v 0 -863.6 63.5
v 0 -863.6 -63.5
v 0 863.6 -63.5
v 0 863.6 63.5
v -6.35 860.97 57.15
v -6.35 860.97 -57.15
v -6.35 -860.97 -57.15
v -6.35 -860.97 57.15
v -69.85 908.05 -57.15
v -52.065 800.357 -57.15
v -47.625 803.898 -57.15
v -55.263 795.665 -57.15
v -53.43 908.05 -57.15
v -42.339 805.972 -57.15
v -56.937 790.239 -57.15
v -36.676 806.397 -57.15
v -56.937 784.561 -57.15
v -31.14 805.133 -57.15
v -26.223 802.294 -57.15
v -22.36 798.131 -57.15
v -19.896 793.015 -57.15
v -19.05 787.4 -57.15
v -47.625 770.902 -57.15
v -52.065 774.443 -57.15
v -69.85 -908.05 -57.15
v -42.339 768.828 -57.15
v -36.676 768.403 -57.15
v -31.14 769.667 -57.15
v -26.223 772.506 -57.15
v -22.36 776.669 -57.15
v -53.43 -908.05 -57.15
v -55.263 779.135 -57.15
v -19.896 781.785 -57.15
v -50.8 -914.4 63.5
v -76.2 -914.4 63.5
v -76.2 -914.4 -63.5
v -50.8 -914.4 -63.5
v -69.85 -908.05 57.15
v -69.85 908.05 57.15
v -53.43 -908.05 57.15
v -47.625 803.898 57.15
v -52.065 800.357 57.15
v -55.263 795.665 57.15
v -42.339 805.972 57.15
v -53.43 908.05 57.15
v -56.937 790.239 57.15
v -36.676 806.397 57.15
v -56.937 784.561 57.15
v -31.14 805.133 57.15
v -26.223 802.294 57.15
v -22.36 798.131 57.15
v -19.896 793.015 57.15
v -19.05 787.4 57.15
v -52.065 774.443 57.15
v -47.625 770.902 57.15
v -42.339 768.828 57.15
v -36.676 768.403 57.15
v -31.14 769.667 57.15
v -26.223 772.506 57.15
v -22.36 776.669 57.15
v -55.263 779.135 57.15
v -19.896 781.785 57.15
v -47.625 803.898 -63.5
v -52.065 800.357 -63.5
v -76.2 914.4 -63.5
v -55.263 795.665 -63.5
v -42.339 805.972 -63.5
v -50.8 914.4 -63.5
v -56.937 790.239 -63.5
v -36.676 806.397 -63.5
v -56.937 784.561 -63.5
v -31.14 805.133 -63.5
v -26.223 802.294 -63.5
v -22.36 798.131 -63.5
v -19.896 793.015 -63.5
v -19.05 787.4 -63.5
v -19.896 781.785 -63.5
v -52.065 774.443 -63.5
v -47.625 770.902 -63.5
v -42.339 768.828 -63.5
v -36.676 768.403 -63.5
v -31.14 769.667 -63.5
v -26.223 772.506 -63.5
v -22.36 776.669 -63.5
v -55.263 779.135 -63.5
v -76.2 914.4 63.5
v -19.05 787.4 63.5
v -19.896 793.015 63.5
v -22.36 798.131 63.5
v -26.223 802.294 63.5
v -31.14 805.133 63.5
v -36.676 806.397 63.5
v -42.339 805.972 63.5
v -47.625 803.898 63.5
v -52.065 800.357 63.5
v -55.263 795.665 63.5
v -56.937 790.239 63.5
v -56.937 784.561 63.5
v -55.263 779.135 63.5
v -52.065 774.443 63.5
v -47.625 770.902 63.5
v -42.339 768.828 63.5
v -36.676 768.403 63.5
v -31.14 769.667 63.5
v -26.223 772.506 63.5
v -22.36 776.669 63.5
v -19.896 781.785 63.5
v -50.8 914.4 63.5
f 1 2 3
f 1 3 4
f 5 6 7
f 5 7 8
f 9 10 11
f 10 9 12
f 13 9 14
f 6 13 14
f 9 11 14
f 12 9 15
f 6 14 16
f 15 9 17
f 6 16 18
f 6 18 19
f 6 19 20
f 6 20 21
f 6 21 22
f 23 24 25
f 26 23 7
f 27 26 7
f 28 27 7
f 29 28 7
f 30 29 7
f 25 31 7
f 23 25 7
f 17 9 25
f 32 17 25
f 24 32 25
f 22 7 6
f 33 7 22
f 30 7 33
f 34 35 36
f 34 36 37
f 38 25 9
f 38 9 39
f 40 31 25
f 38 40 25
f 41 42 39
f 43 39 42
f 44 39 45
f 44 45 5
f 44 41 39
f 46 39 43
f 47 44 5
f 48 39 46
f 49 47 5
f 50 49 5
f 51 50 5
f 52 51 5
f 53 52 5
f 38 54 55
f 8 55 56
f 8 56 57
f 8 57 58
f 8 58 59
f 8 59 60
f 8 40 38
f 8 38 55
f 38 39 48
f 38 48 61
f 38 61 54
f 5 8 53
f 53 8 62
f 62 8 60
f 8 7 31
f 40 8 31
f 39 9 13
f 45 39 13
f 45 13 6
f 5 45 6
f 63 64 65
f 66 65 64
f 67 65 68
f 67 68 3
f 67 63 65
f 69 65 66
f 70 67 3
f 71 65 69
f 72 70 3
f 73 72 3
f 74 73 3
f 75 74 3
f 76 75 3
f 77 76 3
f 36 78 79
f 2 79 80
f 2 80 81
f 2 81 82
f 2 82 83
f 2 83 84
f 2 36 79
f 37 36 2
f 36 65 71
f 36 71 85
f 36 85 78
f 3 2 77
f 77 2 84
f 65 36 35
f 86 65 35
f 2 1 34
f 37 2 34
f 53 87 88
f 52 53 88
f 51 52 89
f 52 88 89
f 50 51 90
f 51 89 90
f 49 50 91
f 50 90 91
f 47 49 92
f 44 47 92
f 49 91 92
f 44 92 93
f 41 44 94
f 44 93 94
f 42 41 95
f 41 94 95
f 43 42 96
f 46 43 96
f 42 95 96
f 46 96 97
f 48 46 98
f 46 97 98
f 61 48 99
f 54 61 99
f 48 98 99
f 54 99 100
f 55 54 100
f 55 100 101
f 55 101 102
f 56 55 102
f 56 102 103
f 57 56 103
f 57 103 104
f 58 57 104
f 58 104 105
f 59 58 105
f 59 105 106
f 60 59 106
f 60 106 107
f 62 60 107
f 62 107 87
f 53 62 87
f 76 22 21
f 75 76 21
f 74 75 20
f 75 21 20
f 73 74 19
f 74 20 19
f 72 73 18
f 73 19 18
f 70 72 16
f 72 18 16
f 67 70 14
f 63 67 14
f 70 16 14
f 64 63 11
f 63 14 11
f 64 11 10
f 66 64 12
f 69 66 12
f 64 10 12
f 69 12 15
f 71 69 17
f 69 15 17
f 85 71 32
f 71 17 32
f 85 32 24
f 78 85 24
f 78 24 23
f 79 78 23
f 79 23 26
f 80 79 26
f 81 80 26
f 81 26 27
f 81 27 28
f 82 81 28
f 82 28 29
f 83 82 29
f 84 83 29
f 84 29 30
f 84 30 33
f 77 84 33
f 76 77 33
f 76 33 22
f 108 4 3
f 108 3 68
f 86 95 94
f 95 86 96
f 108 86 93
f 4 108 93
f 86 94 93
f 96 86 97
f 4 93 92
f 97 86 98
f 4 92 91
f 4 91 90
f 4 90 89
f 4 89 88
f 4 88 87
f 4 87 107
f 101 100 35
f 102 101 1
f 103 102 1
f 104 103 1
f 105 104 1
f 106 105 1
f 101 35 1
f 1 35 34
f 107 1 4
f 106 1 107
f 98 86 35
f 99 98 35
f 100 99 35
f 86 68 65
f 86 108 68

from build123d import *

# Parameters (mm, degrees)
F0_W          = 76.2
F0_H          = 127
F0_W_2        = 63.5
F0_H_2        = 114.3
F1_DEPTH      = 914.4
F2_R          = 19.05
F3_DEPTH      = 127.001
F5_DEPTH      = 63.5
F5_DEPTH_BACK = 63.5
F7_DEPTH      = 63.5
F7_DEPTH_BACK = 63.5
F9_DEPTH      = 63.5
F9_DEPTH_BACK = 63.5


with BuildPart() as f1:
    # F0 (on Front) → F1 (new body, symmetric)
    with BuildSketch(Plane.XZ):
        with Locations((-38.1, 0)):
            Rectangle(F0_W, F0_H)
        with Locations((-38.1, 0)):
            Rectangle(F0_W_2, F0_H_2, mode=Mode.SUBTRACT)
    extrude(amount=F1_DEPTH, both=True)

    # F2 (on face) → F3 (cut, through all)
    with BuildSketch(Plane.XY.offset(63.5)):
        with Locations((-38.1, 787.4)):
            Circle(F2_R)
    extrude(amount=-F3_DEPTH, mode=Mode.SUBTRACT)

    # F4 (on Top) → F5 (cut, two sides)
    with BuildSketch(Plane.XY) as f5_sk:
        Polygon((0, -863.6), (-50.8, -914.4), (0, -914.4), align=None)
        Polygon((0, 863.6), (0, 914.4), (-50.8, 914.4), align=None)
    extrude(amount=F5_DEPTH, mode=Mode.SUBTRACT)
    extrude(f5_sk.sketch, amount=-F5_DEPTH_BACK, mode=Mode.SUBTRACT)

    # F6 (on Top) → F7 (join, two sides)
    with BuildSketch(Plane.XY) as f7_sk:
        Polygon((-76.2, -908.05), (-76.2, -914.4), (-50.8, -914.4), (0, -863.6), (0, -854.619744), (-53.430256, -908.05), align=None)
    extrude(amount=F7_DEPTH)
    extrude(f7_sk.sketch, amount=-F7_DEPTH_BACK)

    # F8 (on Top) → F9 (join, two sides)
    with BuildSketch(Plane.XY) as f9_sk:
        Polygon((-50.8, 914.4), (-76.2, 914.4), (-76.2, 908.05), (-53.430256, 908.05), (0, 854.619744), (0, 863.6), align=None)
    extrude(amount=F9_DEPTH)
    extrude(f9_sk.sketch, amount=-F9_DEPTH_BACK)


solid = f1.part
